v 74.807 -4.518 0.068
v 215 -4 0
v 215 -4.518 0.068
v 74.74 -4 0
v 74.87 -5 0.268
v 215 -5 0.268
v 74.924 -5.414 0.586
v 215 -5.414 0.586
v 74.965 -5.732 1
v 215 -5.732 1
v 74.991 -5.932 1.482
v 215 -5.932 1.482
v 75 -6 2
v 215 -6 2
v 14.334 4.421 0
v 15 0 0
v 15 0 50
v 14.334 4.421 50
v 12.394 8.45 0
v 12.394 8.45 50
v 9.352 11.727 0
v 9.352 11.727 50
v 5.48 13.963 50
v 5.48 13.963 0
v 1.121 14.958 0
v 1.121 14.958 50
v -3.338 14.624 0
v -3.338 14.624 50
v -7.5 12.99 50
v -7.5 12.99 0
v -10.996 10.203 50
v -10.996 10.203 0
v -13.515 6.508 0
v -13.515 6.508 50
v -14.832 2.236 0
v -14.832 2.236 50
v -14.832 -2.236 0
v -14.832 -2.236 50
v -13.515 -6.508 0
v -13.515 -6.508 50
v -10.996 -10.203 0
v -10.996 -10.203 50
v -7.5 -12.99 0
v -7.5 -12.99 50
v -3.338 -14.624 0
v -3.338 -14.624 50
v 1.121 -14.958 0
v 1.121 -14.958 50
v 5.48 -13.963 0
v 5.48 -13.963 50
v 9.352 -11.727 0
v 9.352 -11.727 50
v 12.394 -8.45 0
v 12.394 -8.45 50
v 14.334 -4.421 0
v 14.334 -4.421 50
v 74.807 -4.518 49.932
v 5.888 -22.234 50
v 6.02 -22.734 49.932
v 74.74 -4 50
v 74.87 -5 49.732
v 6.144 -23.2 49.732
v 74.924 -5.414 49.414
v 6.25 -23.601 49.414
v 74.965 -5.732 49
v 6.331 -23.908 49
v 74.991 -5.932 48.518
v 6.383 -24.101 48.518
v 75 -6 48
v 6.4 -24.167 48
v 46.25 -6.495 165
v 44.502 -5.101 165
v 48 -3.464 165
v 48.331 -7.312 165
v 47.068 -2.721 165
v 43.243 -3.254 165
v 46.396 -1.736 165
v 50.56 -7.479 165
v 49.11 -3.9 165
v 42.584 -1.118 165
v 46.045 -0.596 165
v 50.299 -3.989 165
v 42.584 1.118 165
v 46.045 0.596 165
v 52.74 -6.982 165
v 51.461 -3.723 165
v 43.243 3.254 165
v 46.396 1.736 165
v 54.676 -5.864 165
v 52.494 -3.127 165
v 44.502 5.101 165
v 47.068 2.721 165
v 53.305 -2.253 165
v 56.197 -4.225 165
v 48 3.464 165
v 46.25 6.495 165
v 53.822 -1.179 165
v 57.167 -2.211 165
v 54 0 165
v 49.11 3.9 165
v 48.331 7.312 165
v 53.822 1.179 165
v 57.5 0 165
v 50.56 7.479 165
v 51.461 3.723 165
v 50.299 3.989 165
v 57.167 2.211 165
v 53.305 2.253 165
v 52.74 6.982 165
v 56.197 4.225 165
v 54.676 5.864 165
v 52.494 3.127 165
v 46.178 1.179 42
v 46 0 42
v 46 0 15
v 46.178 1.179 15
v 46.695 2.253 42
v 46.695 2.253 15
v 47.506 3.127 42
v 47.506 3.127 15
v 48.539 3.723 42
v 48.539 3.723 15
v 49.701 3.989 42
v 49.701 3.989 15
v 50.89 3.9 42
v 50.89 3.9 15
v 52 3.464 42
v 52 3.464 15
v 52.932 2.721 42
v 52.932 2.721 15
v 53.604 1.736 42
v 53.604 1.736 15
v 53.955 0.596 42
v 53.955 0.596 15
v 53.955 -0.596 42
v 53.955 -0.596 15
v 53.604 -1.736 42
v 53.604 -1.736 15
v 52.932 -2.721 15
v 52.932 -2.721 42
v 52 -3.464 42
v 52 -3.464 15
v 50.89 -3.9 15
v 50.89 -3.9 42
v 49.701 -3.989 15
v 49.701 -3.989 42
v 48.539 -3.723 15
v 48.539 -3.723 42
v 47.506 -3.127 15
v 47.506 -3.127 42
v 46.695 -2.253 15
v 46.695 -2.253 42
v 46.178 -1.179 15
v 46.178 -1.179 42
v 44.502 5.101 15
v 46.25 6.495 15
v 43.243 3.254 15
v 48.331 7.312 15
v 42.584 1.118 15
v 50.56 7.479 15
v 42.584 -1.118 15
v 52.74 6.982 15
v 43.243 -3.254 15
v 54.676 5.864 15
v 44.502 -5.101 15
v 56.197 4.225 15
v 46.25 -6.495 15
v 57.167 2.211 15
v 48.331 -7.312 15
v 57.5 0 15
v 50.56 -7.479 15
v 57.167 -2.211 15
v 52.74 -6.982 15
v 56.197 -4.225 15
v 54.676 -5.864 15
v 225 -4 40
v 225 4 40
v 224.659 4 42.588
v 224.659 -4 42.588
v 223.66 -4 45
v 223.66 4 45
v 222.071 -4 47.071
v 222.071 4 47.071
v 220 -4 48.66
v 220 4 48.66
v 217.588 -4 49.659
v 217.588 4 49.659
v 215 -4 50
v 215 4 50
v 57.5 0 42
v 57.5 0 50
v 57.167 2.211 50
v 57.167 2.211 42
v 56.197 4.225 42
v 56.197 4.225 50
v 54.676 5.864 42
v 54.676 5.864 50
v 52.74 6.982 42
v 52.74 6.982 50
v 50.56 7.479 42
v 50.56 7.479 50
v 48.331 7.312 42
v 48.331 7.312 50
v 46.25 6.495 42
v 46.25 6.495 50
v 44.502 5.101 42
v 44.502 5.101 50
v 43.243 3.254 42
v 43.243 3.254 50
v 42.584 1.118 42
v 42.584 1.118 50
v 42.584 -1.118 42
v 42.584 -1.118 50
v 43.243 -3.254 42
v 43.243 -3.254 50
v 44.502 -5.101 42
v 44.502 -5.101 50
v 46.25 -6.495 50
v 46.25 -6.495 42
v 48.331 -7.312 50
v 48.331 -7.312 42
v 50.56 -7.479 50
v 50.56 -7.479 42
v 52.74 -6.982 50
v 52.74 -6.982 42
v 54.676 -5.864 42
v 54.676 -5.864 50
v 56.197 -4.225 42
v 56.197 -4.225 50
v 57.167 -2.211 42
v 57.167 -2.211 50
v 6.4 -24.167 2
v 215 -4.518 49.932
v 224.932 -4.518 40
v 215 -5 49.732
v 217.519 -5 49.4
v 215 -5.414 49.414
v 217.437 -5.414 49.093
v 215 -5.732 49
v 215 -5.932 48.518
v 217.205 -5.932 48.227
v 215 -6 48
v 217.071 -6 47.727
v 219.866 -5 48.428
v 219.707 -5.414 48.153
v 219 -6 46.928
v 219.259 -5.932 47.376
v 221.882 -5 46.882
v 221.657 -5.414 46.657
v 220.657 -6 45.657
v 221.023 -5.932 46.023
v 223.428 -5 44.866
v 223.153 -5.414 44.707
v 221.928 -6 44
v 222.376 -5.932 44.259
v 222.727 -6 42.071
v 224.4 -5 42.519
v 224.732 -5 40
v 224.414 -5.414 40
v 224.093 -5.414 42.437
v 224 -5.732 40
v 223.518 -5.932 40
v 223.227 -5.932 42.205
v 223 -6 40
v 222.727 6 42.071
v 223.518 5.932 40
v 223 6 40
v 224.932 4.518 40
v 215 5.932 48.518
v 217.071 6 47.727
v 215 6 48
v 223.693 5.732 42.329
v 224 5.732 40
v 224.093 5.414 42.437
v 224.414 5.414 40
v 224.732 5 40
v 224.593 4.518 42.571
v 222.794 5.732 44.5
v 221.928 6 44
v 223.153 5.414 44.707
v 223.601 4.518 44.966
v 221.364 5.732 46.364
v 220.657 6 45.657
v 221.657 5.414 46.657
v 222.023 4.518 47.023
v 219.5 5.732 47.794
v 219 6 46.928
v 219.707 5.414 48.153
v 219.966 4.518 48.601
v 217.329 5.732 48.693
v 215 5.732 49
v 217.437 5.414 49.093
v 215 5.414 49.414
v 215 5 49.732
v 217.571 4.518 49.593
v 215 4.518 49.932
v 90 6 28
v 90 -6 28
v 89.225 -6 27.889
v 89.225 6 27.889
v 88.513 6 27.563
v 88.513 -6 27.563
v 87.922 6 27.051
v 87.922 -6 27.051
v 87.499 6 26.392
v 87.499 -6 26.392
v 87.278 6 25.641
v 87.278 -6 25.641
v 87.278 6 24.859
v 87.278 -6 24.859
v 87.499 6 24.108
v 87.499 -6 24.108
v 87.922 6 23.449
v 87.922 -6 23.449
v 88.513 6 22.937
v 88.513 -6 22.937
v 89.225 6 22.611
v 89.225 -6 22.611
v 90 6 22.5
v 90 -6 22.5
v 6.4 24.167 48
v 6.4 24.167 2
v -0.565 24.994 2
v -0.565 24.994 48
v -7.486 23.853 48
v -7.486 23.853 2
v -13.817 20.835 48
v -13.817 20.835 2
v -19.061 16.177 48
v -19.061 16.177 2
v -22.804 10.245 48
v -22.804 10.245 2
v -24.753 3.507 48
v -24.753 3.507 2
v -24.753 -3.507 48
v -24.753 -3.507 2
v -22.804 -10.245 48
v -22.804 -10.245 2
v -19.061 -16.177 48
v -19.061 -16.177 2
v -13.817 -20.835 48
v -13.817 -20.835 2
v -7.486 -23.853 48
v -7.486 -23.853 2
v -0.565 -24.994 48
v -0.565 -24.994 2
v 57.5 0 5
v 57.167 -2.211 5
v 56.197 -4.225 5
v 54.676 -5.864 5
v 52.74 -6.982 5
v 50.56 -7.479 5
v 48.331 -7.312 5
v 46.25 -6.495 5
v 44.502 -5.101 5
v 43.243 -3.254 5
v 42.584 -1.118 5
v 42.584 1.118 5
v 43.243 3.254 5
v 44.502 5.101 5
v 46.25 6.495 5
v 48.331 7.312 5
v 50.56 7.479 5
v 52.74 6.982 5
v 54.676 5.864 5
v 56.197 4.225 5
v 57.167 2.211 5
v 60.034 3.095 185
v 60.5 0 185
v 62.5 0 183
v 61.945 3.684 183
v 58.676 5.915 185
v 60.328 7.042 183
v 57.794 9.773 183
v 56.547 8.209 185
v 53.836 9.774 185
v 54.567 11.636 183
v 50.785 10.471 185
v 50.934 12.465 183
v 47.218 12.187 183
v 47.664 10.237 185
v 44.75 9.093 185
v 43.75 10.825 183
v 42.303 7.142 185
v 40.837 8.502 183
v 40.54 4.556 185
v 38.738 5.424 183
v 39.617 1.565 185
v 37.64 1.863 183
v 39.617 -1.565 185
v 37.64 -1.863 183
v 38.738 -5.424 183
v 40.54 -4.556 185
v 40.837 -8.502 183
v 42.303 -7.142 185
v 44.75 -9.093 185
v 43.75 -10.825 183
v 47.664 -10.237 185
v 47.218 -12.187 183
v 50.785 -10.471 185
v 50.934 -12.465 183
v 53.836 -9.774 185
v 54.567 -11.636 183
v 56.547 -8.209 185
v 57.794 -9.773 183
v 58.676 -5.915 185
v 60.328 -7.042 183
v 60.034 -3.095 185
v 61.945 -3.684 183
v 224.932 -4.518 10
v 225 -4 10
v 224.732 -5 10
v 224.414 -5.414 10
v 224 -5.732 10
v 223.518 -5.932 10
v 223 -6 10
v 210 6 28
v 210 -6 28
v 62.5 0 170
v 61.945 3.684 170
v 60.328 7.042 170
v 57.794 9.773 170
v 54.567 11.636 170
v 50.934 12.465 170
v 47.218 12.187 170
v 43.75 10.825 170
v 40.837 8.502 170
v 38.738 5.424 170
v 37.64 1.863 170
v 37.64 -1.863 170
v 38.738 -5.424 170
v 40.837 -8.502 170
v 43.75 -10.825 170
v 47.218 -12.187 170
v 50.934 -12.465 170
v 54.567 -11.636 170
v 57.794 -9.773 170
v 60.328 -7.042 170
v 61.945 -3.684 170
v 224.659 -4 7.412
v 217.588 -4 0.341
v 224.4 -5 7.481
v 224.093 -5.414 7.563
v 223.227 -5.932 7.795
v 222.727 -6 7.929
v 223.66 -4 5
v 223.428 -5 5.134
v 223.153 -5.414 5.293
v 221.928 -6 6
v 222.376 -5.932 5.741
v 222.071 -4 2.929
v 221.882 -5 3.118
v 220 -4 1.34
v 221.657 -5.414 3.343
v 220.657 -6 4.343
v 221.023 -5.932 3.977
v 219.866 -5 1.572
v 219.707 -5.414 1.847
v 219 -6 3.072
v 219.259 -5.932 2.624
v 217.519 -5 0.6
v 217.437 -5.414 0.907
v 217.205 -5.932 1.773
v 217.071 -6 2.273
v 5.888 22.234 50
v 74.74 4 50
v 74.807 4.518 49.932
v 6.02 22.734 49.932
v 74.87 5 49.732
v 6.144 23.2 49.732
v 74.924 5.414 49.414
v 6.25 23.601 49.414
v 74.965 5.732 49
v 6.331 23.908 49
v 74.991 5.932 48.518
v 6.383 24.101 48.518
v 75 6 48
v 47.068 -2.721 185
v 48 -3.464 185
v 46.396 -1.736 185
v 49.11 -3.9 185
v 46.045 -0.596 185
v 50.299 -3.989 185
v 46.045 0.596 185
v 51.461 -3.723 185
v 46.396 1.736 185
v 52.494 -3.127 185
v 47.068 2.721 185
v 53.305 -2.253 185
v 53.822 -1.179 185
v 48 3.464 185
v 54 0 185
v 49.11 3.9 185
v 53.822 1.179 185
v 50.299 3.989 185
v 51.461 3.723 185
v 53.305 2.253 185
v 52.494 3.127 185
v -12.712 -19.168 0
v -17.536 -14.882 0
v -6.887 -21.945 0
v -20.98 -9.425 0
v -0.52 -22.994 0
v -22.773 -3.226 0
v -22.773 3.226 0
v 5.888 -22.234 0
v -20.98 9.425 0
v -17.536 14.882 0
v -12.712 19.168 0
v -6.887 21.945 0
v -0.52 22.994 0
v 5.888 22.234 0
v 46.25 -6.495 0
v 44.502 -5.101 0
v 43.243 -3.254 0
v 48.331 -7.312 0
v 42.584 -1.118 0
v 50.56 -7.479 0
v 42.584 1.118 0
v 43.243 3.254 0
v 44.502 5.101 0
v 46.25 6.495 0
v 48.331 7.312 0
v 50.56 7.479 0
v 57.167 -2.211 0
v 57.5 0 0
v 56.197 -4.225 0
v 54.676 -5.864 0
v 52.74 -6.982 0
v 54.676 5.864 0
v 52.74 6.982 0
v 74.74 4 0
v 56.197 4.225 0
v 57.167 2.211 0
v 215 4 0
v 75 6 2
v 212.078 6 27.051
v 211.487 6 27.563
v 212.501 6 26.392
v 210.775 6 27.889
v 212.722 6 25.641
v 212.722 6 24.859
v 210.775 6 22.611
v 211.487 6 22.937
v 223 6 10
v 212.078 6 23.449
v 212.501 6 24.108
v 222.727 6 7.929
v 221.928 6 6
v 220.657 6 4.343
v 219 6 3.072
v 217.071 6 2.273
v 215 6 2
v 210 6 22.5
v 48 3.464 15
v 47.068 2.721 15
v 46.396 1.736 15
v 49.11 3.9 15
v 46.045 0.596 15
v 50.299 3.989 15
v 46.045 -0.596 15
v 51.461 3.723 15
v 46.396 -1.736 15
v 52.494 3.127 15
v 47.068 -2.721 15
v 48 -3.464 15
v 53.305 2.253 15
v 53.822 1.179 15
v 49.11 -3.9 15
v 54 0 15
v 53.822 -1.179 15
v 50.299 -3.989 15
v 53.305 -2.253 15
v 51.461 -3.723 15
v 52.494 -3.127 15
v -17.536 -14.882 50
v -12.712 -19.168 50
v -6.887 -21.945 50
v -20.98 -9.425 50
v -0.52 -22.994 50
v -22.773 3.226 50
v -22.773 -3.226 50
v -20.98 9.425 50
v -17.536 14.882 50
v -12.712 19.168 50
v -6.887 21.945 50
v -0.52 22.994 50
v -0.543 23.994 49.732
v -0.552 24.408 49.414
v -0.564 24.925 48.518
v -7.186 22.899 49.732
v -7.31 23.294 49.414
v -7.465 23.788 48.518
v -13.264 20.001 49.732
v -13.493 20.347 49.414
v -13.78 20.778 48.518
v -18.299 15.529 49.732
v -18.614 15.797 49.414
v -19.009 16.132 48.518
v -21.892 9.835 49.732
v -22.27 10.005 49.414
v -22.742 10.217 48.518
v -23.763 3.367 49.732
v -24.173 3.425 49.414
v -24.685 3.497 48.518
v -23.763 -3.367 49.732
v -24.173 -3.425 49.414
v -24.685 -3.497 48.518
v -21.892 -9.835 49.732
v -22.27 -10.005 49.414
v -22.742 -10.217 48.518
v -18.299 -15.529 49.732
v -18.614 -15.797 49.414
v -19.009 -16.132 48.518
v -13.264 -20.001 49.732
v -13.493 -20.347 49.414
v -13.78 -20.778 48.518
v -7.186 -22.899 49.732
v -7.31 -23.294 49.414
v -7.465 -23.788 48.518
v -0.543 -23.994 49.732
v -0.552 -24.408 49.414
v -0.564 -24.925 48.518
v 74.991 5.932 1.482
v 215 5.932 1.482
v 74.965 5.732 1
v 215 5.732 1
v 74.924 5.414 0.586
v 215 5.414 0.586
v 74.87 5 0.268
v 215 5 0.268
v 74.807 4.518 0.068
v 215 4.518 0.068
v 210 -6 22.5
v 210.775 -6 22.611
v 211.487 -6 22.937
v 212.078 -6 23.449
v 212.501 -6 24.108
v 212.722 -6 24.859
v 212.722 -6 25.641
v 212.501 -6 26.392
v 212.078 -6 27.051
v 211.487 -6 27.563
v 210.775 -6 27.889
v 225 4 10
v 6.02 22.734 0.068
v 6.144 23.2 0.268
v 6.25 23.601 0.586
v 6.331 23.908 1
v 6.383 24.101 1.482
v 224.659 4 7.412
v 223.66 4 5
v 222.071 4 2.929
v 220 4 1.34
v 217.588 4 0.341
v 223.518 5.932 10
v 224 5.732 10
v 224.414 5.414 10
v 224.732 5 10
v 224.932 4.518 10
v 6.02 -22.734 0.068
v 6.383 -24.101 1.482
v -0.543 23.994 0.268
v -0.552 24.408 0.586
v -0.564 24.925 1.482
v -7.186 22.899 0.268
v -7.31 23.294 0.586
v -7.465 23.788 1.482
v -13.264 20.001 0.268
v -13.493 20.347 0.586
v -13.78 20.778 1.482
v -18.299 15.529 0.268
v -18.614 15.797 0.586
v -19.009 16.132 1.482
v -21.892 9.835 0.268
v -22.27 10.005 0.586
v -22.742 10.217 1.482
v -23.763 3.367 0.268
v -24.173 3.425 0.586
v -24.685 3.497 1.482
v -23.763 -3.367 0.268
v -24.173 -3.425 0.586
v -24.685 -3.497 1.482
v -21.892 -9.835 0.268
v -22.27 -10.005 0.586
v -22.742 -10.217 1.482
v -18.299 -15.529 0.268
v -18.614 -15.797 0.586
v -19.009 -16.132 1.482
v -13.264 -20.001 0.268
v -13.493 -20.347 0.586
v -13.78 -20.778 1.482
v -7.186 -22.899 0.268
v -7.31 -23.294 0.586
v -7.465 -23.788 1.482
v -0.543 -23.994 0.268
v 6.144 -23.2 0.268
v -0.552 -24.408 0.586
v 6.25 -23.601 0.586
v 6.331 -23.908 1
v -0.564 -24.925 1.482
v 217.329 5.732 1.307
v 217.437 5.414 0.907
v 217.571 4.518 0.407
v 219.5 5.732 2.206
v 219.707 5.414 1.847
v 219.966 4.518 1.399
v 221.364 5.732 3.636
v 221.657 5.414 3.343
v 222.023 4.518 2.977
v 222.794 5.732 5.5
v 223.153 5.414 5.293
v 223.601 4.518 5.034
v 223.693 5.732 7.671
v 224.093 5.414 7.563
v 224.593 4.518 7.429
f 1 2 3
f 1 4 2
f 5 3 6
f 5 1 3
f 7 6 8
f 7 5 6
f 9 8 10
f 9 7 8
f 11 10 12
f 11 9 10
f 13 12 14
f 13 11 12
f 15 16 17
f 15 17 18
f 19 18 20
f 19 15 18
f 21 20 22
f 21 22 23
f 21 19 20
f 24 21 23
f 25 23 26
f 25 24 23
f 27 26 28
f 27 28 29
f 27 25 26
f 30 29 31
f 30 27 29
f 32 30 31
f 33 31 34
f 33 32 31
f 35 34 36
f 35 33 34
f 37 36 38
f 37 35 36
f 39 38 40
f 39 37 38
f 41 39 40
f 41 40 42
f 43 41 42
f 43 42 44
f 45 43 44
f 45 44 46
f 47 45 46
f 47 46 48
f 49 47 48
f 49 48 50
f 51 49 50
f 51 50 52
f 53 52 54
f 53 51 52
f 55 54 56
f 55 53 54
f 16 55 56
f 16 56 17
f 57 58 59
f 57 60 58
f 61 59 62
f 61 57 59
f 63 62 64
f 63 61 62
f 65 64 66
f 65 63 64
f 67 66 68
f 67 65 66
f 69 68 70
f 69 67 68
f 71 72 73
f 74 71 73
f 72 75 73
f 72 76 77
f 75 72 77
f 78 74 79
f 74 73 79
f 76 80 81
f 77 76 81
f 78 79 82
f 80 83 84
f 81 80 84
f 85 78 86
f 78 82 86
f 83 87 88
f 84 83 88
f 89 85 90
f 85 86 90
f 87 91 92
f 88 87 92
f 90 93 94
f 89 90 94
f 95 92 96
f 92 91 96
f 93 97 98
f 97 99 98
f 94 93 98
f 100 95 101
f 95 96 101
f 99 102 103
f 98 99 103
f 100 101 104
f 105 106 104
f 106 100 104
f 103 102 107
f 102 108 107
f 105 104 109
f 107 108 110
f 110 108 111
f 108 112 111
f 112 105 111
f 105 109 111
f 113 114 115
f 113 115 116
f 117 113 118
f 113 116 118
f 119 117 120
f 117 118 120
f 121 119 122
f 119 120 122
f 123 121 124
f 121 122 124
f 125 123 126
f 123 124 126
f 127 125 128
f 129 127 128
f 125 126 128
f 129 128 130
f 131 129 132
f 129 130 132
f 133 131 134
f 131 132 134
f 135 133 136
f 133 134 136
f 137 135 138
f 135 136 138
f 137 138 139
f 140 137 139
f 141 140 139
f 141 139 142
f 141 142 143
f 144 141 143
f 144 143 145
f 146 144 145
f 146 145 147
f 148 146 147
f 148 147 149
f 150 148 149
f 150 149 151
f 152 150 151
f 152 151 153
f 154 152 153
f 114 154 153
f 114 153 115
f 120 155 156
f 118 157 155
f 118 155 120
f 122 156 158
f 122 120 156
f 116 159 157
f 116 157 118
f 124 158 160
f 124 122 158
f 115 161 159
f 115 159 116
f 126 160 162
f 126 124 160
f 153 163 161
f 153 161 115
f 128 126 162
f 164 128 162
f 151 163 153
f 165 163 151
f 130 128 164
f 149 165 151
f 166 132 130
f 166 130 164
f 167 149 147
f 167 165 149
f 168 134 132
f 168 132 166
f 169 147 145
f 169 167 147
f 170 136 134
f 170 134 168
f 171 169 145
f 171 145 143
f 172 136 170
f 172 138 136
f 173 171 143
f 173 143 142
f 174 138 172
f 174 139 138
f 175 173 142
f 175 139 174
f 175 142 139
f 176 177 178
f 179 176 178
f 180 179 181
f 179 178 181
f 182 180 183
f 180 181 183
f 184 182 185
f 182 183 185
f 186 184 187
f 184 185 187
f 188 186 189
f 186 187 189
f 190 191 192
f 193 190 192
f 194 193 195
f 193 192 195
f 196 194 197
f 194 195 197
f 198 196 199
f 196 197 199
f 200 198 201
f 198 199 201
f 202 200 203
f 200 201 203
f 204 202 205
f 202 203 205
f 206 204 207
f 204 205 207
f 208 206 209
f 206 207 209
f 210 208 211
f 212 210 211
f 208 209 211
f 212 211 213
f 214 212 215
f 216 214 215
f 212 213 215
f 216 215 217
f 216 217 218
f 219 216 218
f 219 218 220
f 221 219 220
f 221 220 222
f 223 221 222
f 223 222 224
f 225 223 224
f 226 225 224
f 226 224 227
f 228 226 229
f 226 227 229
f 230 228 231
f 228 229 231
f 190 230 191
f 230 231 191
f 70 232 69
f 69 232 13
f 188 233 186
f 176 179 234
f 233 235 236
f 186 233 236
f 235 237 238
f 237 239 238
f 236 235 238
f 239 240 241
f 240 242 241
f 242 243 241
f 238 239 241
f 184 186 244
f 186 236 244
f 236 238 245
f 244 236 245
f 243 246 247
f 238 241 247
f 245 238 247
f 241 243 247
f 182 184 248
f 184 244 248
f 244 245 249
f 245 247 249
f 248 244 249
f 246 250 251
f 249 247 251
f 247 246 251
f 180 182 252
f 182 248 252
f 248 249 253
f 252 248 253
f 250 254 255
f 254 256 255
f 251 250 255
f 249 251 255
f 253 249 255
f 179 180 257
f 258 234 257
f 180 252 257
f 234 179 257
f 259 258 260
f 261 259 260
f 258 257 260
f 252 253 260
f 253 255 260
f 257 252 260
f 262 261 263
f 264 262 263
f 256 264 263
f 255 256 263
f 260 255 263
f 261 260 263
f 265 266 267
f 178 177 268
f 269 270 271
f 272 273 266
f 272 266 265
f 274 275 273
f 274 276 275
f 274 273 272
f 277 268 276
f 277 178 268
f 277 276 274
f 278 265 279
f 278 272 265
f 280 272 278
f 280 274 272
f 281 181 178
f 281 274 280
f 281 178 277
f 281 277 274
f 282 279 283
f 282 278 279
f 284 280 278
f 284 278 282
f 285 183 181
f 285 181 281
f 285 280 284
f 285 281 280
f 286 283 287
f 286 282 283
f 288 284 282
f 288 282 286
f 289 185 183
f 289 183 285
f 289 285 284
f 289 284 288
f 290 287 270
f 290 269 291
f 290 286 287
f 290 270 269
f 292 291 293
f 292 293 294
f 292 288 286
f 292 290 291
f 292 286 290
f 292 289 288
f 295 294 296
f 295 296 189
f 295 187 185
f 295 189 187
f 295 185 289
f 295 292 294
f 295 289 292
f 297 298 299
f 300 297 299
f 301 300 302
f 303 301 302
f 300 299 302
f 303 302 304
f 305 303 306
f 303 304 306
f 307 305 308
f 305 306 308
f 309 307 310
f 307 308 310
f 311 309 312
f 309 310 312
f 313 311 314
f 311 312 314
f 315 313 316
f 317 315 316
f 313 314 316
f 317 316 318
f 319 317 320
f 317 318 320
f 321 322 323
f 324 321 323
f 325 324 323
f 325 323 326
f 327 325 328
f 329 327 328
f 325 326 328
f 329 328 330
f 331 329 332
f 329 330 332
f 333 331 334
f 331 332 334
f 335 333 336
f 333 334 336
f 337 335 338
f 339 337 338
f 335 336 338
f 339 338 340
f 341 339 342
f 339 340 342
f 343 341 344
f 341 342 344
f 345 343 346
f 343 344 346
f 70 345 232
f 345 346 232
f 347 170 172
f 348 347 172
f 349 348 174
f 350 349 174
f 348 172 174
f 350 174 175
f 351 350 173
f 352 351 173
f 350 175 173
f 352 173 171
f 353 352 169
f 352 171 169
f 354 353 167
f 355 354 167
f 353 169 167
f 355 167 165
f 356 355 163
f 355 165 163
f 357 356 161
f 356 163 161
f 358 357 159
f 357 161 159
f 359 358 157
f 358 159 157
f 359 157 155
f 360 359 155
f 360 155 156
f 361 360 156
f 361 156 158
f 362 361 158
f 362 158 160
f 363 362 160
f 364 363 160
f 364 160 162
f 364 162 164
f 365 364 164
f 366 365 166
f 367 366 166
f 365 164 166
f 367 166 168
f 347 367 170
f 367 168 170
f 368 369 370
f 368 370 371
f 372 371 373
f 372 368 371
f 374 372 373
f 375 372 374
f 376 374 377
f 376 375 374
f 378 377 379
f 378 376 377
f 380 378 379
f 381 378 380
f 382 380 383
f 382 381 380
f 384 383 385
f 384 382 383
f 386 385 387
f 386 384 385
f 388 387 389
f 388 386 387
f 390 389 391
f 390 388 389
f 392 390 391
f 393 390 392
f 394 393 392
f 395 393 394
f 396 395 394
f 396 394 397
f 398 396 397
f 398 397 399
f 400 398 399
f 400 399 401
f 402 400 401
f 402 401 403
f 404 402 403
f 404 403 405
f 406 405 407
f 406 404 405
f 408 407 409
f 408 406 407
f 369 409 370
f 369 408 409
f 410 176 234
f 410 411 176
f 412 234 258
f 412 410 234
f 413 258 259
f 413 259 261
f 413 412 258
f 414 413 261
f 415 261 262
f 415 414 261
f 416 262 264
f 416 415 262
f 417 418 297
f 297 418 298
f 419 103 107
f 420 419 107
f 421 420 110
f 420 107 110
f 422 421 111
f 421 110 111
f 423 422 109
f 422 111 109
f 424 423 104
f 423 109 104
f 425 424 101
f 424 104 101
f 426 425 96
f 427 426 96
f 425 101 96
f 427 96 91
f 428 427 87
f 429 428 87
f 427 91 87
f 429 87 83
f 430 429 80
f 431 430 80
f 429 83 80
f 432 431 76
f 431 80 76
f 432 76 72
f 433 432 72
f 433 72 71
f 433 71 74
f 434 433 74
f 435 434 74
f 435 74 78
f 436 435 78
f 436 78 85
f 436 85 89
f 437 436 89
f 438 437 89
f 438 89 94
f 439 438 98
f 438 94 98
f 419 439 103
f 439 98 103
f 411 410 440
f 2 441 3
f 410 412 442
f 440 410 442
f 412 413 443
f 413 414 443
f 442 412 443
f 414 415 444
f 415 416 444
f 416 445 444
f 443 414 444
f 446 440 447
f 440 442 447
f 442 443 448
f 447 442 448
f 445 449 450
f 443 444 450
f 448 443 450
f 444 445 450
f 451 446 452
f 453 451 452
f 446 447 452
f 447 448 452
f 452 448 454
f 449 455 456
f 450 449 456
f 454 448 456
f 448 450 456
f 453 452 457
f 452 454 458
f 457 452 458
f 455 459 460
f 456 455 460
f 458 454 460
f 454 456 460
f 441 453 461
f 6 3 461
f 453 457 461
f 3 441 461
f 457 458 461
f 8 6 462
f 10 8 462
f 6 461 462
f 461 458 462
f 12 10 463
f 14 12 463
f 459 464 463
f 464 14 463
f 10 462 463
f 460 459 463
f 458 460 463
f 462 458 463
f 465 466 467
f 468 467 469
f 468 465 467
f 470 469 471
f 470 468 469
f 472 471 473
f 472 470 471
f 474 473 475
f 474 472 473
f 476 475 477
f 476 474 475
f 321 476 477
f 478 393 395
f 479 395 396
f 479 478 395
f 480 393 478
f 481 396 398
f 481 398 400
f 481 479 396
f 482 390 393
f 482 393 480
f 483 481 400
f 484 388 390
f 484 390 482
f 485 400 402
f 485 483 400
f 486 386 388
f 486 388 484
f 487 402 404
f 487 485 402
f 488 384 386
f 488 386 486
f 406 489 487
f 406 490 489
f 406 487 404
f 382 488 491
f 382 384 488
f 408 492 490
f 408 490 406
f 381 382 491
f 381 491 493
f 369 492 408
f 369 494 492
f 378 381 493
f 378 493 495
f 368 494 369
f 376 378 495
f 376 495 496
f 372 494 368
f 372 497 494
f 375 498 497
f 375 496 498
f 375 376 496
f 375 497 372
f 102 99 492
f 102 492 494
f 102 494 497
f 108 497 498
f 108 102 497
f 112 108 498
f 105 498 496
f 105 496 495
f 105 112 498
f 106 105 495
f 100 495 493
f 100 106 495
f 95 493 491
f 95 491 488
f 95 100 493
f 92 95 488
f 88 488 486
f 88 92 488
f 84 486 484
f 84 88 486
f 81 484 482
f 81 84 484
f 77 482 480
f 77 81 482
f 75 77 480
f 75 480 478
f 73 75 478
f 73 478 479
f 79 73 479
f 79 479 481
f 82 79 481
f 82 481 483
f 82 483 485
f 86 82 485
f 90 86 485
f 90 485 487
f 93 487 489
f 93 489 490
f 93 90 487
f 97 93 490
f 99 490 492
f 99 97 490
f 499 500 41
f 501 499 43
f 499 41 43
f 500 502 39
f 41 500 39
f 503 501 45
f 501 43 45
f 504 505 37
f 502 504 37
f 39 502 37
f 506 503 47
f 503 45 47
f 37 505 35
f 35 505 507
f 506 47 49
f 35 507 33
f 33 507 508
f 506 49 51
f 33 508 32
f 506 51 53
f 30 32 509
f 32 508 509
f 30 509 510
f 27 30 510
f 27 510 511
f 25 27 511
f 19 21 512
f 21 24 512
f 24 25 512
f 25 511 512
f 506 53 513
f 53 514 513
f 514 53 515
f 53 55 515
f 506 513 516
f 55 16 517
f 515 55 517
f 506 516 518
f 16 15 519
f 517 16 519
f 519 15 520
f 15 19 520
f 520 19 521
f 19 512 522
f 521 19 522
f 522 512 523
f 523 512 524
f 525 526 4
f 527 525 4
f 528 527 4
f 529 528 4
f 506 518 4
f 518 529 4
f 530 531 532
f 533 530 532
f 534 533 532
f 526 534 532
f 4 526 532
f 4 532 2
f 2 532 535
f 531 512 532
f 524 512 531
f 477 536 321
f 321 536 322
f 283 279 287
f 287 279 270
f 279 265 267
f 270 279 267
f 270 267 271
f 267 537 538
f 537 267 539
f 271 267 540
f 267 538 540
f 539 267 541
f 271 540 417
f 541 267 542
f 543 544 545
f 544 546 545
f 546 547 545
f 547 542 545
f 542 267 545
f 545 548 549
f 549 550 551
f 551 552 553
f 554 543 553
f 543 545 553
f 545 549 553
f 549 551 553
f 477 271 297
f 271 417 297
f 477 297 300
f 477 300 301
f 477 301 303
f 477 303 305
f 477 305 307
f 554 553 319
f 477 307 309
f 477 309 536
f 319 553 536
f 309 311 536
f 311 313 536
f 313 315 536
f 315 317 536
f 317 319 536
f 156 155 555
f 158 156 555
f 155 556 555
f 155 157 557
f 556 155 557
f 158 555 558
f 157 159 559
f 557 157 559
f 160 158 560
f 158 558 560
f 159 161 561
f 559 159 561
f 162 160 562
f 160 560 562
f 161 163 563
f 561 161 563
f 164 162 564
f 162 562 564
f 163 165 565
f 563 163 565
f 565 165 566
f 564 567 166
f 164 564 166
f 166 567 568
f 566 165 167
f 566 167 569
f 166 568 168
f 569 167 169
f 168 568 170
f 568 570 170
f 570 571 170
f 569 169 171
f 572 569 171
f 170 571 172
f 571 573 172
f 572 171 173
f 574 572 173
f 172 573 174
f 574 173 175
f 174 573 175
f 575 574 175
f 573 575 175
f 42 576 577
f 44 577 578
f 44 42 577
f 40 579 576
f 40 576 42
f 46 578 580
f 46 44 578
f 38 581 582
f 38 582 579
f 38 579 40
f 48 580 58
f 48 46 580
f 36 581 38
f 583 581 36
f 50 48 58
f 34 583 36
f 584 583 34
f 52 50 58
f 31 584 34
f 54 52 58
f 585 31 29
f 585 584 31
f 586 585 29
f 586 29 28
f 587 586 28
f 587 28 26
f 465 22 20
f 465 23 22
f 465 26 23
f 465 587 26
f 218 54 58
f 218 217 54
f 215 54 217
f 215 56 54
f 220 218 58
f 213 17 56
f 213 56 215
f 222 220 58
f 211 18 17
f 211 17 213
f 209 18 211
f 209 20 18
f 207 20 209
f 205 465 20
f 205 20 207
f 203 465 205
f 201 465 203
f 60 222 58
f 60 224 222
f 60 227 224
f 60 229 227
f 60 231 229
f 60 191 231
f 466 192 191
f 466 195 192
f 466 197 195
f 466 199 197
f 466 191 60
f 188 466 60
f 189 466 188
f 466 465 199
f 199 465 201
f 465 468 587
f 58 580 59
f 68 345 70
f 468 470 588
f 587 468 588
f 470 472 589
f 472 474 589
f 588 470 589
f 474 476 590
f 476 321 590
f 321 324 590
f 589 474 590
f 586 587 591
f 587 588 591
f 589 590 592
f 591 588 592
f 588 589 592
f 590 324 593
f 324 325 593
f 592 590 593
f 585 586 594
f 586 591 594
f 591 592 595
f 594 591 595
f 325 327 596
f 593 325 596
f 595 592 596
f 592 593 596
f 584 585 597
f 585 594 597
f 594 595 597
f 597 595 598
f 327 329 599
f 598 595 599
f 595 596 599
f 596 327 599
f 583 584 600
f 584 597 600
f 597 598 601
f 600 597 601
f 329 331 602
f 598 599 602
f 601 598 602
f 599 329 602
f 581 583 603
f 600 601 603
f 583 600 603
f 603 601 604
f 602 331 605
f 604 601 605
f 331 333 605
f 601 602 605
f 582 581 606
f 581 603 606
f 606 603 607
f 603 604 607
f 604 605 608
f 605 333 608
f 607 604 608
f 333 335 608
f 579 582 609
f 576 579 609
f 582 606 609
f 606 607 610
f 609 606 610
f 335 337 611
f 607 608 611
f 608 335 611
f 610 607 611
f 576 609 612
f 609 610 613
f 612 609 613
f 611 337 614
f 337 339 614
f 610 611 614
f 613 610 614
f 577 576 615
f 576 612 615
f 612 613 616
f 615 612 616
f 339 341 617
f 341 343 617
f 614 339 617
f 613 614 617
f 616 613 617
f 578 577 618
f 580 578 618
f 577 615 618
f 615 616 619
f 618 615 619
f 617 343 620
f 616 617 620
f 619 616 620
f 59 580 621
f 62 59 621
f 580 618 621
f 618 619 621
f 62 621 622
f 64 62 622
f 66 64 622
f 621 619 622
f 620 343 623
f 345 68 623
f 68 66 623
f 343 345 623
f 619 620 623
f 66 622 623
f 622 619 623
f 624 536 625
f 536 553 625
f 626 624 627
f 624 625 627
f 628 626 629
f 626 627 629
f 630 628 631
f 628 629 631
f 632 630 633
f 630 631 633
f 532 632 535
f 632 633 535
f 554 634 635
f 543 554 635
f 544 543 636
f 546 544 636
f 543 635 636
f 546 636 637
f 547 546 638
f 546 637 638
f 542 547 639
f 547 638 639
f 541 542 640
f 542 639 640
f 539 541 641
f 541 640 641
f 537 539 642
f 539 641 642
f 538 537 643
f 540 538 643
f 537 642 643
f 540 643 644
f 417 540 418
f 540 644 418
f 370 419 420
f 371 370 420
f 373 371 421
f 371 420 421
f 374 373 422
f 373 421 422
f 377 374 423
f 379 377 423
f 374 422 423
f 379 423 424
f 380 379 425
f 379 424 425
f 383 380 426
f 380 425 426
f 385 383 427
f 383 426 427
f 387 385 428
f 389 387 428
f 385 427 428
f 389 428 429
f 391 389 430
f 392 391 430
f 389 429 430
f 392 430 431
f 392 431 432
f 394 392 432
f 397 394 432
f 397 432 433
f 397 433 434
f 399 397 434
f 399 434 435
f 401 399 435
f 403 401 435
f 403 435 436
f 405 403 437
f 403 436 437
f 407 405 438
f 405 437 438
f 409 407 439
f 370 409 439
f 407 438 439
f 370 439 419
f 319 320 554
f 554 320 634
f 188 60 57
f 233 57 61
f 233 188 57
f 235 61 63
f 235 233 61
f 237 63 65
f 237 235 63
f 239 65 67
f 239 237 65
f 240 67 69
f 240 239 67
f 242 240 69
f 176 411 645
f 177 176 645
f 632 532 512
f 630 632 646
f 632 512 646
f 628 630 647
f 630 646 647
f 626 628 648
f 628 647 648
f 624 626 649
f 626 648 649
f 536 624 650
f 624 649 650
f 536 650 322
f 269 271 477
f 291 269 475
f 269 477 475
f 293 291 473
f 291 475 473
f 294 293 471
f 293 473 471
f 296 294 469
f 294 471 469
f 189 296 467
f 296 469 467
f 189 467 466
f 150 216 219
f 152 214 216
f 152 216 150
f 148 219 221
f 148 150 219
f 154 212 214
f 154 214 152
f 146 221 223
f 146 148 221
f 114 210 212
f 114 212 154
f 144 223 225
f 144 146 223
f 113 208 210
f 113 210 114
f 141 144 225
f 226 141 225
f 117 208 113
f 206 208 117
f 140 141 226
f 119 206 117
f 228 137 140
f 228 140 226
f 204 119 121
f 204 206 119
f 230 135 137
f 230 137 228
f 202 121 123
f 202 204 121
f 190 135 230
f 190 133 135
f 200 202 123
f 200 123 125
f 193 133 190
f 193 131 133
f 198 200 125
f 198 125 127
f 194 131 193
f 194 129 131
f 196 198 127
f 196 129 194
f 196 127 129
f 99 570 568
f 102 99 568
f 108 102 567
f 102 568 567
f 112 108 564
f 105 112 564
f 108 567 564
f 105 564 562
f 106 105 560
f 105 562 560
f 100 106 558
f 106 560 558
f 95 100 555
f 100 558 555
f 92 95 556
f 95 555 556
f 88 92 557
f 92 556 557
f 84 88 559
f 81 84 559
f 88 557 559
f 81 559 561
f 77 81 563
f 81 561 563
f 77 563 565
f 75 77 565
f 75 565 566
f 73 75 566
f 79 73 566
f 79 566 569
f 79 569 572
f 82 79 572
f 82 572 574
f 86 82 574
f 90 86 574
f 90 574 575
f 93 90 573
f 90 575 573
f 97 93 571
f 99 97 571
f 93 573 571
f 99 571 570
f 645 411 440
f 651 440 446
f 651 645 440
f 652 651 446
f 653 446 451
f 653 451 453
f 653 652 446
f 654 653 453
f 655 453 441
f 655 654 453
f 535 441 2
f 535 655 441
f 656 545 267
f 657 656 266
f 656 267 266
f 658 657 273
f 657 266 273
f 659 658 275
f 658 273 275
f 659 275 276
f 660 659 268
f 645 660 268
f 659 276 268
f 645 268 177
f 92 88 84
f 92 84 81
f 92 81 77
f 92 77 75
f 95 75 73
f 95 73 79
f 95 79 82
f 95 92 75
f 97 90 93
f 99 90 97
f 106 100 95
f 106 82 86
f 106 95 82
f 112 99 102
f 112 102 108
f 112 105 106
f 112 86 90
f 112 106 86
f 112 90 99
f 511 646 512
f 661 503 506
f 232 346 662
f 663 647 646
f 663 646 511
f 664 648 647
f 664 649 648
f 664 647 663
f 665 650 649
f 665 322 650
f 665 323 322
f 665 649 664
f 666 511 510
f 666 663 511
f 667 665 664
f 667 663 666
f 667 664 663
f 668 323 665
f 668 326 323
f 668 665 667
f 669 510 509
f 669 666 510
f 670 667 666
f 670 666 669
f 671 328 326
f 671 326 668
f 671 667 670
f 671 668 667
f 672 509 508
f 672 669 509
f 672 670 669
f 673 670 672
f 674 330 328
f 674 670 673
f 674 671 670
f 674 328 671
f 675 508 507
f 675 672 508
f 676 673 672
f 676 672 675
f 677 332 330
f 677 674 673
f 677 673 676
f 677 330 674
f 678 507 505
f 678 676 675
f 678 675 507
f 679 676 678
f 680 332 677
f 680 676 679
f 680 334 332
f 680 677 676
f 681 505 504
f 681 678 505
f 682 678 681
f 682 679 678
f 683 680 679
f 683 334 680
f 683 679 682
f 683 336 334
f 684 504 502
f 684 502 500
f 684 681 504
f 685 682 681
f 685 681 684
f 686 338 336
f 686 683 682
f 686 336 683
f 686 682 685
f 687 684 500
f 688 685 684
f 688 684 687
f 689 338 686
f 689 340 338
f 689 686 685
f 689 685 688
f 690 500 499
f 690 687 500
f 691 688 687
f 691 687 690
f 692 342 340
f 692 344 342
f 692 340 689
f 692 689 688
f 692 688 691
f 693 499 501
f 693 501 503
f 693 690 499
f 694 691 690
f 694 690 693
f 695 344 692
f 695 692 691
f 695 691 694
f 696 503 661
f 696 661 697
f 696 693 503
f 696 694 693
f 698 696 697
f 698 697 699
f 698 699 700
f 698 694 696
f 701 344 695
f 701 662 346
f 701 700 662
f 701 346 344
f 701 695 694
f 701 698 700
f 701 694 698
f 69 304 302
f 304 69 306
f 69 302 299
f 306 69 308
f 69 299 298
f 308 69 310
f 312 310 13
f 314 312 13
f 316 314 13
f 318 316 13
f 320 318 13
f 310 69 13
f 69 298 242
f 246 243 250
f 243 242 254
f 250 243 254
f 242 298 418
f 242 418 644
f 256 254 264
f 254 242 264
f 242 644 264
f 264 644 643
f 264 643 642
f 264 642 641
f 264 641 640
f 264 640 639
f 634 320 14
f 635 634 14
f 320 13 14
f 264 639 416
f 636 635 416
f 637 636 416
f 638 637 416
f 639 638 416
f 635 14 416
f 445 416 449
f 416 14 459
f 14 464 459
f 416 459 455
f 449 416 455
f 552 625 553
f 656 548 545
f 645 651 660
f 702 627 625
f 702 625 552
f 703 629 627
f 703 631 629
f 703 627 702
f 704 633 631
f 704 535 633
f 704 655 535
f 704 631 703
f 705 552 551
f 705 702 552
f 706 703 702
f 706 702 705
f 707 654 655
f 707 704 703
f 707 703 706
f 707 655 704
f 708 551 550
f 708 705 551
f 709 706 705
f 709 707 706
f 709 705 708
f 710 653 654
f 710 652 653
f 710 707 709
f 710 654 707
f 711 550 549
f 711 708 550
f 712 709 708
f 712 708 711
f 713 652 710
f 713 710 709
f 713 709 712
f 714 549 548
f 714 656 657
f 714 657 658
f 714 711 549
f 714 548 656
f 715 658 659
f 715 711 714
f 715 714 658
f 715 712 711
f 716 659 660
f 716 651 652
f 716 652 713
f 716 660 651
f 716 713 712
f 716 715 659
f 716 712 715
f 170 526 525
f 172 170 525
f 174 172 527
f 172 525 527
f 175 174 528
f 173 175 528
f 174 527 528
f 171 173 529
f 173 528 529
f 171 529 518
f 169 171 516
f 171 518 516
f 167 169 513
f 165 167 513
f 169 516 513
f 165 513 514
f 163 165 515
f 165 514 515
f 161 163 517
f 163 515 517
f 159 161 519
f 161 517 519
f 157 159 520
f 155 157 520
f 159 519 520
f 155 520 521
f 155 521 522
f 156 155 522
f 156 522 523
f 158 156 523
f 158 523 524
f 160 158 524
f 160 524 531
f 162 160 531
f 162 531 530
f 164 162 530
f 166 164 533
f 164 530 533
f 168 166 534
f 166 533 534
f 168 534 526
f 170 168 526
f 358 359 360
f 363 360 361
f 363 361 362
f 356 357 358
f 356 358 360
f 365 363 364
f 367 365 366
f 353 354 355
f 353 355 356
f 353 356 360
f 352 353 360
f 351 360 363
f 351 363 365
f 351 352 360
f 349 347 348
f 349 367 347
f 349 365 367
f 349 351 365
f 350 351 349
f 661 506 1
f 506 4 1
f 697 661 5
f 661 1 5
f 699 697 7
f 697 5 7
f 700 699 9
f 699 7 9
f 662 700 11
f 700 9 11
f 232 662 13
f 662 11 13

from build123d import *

# Parameters (mm, degrees)
F0_R      = 15
F1_DEPTH  = 50
F3_DEPTH  = 25
F4_R      = 7.5
F5_DEPTH  = 15
F6_R      = 7.5
F7_DEPTH  = 8
F8_R      = 10
F9_R      = 2
F10_DEPTH = 25
F11_R     = 7.5
F12_DEPTH = 10
F13_R     = 4
F14_DEPTH = 150
F15_R     = 12.5
F15_R_2   = 4
F16_DEPTH = 20
F17_SIZE  = 2
F18_SIZE  = 5


with BuildPart() as f1:
    # F0 (on Top) → F1 (new body)
    with BuildSketch(Plane.XY):
        with BuildLine():
            Line((225, 6), (75, 6))
            Line((75, 6), (6.3999793324, 24.1669250122))
            ThreePointArc((6.3999793324, 24.1669250122), (-25, 0), (6.3999793324, -24.1669250122))
            Line((6.3999793324, -24.1669250122), (75, -6))
            Line((75, -6), (225, -6))
            Line((225, -6), (225, 0))
            Line((225, 0), (225, 6))
        make_face()
        Circle(F0_R, mode=Mode.SUBTRACT)
        with BuildLine():
            ThreePointArc((54, 0), (50, -4), (46, 0))
            ThreePointArc((46, 0), (50, 4), (54, 0))
        make_face(mode=Mode.SUBTRACT)
    extrude(amount=F1_DEPTH)

    # F2 (on face) → F3 (cut)
    with BuildSketch(Plane.XZ.offset(6)):
        with BuildLine():
            ThreePointArc((90, 28), (87.25, 25.25), (90, 22.5))
            Line((90, 22.5), (150, 22.5))
            Line((150, 22.5), (210, 22.5))
            ThreePointArc((210, 22.5), (212.75, 25.25), (210, 28))
            Line((210, 28), (90, 28))
        make_face()
    extrude(amount=-F3_DEPTH, mode=Mode.SUBTRACT)

    # F4 (on face) → F5 (cut)
    with BuildSketch(Plane(origin=(0, 0, 0), x_dir=(1, 0, 0), z_dir=(0, 0, -1))):
        with Locations((50, 0)):
            Circle(F4_R)
    extrude(amount=-F5_DEPTH, mode=Mode.SUBTRACT)

    # F6 (on face) → F7 (cut)
    with BuildSketch(Plane.XY.offset(50)):
        with Locations((50, 0)):
            Circle(F6_R)
    extrude(amount=-F7_DEPTH, mode=Mode.SUBTRACT)

    # F8
    f8_edges = [f1.edges().sort_by_distance(p)[0] for p in [
        (225, 0, 50),
        (225, 0, 0),
    ]]
    fillet(f8_edges, radius=F8_R)

    # F9
    f9_edges = [f1.edges().sort_by_distance(p)[0] for p in [
        (145, 6, 50),
        (145, -6, 50),
        (40.69999, 15.083463, 50),
        (40.69999, 15.083463, 0),
    ]]
    fillet(f9_edges, radius=F9_R)

    # F2 (on face) → F10 (cut)
    with BuildSketch(Plane.XZ.offset(6)):
        with BuildLine():
            ThreePointArc((90, 28), (87.25, 25.25), (90, 22.5))
            Line((90, 22.5), (150, 22.5))
            Line((150, 22.5), (210, 22.5))
            ThreePointArc((210, 22.5), (212.75, 25.25), (210, 28))
            Line((210, 28), (90, 28))
        make_face()
    extrude(amount=-F10_DEPTH, mode=Mode.SUBTRACT)


with BuildPart() as f12:
    # F11 (on face) → F12 (new body)
    with BuildSketch(Plane(origin=(0, 0, 15), x_dir=(1, 0, 0), z_dir=(0, 0, -1))):
        with Locations((50, 0)):
            Circle(F11_R)
    extrude(amount=F12_DEPTH)

    # F13 (on face) → F14 (join)
    with BuildSketch(Plane.XY.offset(15)):
        with Locations((50, 0)):
            Circle(F13_R)
    extrude(amount=F14_DEPTH)


with BuildPart() as f16:
    # F15 (on face) → F16 (new body)
    with BuildSketch(Plane.XY.offset(165)):
        with Locations((50, 0)):
            Circle(F15_R)
        with Locations((50, 0)):
            Circle(F15_R_2, mode=Mode.SUBTRACT)
    extrude(amount=F16_DEPTH)

    # F17
    f17_edges = [f16.edges().sort_by_distance(p)[0] for p in [
        (37.5, 0, 185),
    ]]
    chamfer(f17_edges, length=F17_SIZE)

    # F18
    f18_edges = [f16.edges().sort_by_distance(p)[0] for p in [
        (37.5, 0, 165),
    ]]
    chamfer(f18_edges, length=F18_SIZE)


solid = Compound([f1.part, f12.part, f16.part])
